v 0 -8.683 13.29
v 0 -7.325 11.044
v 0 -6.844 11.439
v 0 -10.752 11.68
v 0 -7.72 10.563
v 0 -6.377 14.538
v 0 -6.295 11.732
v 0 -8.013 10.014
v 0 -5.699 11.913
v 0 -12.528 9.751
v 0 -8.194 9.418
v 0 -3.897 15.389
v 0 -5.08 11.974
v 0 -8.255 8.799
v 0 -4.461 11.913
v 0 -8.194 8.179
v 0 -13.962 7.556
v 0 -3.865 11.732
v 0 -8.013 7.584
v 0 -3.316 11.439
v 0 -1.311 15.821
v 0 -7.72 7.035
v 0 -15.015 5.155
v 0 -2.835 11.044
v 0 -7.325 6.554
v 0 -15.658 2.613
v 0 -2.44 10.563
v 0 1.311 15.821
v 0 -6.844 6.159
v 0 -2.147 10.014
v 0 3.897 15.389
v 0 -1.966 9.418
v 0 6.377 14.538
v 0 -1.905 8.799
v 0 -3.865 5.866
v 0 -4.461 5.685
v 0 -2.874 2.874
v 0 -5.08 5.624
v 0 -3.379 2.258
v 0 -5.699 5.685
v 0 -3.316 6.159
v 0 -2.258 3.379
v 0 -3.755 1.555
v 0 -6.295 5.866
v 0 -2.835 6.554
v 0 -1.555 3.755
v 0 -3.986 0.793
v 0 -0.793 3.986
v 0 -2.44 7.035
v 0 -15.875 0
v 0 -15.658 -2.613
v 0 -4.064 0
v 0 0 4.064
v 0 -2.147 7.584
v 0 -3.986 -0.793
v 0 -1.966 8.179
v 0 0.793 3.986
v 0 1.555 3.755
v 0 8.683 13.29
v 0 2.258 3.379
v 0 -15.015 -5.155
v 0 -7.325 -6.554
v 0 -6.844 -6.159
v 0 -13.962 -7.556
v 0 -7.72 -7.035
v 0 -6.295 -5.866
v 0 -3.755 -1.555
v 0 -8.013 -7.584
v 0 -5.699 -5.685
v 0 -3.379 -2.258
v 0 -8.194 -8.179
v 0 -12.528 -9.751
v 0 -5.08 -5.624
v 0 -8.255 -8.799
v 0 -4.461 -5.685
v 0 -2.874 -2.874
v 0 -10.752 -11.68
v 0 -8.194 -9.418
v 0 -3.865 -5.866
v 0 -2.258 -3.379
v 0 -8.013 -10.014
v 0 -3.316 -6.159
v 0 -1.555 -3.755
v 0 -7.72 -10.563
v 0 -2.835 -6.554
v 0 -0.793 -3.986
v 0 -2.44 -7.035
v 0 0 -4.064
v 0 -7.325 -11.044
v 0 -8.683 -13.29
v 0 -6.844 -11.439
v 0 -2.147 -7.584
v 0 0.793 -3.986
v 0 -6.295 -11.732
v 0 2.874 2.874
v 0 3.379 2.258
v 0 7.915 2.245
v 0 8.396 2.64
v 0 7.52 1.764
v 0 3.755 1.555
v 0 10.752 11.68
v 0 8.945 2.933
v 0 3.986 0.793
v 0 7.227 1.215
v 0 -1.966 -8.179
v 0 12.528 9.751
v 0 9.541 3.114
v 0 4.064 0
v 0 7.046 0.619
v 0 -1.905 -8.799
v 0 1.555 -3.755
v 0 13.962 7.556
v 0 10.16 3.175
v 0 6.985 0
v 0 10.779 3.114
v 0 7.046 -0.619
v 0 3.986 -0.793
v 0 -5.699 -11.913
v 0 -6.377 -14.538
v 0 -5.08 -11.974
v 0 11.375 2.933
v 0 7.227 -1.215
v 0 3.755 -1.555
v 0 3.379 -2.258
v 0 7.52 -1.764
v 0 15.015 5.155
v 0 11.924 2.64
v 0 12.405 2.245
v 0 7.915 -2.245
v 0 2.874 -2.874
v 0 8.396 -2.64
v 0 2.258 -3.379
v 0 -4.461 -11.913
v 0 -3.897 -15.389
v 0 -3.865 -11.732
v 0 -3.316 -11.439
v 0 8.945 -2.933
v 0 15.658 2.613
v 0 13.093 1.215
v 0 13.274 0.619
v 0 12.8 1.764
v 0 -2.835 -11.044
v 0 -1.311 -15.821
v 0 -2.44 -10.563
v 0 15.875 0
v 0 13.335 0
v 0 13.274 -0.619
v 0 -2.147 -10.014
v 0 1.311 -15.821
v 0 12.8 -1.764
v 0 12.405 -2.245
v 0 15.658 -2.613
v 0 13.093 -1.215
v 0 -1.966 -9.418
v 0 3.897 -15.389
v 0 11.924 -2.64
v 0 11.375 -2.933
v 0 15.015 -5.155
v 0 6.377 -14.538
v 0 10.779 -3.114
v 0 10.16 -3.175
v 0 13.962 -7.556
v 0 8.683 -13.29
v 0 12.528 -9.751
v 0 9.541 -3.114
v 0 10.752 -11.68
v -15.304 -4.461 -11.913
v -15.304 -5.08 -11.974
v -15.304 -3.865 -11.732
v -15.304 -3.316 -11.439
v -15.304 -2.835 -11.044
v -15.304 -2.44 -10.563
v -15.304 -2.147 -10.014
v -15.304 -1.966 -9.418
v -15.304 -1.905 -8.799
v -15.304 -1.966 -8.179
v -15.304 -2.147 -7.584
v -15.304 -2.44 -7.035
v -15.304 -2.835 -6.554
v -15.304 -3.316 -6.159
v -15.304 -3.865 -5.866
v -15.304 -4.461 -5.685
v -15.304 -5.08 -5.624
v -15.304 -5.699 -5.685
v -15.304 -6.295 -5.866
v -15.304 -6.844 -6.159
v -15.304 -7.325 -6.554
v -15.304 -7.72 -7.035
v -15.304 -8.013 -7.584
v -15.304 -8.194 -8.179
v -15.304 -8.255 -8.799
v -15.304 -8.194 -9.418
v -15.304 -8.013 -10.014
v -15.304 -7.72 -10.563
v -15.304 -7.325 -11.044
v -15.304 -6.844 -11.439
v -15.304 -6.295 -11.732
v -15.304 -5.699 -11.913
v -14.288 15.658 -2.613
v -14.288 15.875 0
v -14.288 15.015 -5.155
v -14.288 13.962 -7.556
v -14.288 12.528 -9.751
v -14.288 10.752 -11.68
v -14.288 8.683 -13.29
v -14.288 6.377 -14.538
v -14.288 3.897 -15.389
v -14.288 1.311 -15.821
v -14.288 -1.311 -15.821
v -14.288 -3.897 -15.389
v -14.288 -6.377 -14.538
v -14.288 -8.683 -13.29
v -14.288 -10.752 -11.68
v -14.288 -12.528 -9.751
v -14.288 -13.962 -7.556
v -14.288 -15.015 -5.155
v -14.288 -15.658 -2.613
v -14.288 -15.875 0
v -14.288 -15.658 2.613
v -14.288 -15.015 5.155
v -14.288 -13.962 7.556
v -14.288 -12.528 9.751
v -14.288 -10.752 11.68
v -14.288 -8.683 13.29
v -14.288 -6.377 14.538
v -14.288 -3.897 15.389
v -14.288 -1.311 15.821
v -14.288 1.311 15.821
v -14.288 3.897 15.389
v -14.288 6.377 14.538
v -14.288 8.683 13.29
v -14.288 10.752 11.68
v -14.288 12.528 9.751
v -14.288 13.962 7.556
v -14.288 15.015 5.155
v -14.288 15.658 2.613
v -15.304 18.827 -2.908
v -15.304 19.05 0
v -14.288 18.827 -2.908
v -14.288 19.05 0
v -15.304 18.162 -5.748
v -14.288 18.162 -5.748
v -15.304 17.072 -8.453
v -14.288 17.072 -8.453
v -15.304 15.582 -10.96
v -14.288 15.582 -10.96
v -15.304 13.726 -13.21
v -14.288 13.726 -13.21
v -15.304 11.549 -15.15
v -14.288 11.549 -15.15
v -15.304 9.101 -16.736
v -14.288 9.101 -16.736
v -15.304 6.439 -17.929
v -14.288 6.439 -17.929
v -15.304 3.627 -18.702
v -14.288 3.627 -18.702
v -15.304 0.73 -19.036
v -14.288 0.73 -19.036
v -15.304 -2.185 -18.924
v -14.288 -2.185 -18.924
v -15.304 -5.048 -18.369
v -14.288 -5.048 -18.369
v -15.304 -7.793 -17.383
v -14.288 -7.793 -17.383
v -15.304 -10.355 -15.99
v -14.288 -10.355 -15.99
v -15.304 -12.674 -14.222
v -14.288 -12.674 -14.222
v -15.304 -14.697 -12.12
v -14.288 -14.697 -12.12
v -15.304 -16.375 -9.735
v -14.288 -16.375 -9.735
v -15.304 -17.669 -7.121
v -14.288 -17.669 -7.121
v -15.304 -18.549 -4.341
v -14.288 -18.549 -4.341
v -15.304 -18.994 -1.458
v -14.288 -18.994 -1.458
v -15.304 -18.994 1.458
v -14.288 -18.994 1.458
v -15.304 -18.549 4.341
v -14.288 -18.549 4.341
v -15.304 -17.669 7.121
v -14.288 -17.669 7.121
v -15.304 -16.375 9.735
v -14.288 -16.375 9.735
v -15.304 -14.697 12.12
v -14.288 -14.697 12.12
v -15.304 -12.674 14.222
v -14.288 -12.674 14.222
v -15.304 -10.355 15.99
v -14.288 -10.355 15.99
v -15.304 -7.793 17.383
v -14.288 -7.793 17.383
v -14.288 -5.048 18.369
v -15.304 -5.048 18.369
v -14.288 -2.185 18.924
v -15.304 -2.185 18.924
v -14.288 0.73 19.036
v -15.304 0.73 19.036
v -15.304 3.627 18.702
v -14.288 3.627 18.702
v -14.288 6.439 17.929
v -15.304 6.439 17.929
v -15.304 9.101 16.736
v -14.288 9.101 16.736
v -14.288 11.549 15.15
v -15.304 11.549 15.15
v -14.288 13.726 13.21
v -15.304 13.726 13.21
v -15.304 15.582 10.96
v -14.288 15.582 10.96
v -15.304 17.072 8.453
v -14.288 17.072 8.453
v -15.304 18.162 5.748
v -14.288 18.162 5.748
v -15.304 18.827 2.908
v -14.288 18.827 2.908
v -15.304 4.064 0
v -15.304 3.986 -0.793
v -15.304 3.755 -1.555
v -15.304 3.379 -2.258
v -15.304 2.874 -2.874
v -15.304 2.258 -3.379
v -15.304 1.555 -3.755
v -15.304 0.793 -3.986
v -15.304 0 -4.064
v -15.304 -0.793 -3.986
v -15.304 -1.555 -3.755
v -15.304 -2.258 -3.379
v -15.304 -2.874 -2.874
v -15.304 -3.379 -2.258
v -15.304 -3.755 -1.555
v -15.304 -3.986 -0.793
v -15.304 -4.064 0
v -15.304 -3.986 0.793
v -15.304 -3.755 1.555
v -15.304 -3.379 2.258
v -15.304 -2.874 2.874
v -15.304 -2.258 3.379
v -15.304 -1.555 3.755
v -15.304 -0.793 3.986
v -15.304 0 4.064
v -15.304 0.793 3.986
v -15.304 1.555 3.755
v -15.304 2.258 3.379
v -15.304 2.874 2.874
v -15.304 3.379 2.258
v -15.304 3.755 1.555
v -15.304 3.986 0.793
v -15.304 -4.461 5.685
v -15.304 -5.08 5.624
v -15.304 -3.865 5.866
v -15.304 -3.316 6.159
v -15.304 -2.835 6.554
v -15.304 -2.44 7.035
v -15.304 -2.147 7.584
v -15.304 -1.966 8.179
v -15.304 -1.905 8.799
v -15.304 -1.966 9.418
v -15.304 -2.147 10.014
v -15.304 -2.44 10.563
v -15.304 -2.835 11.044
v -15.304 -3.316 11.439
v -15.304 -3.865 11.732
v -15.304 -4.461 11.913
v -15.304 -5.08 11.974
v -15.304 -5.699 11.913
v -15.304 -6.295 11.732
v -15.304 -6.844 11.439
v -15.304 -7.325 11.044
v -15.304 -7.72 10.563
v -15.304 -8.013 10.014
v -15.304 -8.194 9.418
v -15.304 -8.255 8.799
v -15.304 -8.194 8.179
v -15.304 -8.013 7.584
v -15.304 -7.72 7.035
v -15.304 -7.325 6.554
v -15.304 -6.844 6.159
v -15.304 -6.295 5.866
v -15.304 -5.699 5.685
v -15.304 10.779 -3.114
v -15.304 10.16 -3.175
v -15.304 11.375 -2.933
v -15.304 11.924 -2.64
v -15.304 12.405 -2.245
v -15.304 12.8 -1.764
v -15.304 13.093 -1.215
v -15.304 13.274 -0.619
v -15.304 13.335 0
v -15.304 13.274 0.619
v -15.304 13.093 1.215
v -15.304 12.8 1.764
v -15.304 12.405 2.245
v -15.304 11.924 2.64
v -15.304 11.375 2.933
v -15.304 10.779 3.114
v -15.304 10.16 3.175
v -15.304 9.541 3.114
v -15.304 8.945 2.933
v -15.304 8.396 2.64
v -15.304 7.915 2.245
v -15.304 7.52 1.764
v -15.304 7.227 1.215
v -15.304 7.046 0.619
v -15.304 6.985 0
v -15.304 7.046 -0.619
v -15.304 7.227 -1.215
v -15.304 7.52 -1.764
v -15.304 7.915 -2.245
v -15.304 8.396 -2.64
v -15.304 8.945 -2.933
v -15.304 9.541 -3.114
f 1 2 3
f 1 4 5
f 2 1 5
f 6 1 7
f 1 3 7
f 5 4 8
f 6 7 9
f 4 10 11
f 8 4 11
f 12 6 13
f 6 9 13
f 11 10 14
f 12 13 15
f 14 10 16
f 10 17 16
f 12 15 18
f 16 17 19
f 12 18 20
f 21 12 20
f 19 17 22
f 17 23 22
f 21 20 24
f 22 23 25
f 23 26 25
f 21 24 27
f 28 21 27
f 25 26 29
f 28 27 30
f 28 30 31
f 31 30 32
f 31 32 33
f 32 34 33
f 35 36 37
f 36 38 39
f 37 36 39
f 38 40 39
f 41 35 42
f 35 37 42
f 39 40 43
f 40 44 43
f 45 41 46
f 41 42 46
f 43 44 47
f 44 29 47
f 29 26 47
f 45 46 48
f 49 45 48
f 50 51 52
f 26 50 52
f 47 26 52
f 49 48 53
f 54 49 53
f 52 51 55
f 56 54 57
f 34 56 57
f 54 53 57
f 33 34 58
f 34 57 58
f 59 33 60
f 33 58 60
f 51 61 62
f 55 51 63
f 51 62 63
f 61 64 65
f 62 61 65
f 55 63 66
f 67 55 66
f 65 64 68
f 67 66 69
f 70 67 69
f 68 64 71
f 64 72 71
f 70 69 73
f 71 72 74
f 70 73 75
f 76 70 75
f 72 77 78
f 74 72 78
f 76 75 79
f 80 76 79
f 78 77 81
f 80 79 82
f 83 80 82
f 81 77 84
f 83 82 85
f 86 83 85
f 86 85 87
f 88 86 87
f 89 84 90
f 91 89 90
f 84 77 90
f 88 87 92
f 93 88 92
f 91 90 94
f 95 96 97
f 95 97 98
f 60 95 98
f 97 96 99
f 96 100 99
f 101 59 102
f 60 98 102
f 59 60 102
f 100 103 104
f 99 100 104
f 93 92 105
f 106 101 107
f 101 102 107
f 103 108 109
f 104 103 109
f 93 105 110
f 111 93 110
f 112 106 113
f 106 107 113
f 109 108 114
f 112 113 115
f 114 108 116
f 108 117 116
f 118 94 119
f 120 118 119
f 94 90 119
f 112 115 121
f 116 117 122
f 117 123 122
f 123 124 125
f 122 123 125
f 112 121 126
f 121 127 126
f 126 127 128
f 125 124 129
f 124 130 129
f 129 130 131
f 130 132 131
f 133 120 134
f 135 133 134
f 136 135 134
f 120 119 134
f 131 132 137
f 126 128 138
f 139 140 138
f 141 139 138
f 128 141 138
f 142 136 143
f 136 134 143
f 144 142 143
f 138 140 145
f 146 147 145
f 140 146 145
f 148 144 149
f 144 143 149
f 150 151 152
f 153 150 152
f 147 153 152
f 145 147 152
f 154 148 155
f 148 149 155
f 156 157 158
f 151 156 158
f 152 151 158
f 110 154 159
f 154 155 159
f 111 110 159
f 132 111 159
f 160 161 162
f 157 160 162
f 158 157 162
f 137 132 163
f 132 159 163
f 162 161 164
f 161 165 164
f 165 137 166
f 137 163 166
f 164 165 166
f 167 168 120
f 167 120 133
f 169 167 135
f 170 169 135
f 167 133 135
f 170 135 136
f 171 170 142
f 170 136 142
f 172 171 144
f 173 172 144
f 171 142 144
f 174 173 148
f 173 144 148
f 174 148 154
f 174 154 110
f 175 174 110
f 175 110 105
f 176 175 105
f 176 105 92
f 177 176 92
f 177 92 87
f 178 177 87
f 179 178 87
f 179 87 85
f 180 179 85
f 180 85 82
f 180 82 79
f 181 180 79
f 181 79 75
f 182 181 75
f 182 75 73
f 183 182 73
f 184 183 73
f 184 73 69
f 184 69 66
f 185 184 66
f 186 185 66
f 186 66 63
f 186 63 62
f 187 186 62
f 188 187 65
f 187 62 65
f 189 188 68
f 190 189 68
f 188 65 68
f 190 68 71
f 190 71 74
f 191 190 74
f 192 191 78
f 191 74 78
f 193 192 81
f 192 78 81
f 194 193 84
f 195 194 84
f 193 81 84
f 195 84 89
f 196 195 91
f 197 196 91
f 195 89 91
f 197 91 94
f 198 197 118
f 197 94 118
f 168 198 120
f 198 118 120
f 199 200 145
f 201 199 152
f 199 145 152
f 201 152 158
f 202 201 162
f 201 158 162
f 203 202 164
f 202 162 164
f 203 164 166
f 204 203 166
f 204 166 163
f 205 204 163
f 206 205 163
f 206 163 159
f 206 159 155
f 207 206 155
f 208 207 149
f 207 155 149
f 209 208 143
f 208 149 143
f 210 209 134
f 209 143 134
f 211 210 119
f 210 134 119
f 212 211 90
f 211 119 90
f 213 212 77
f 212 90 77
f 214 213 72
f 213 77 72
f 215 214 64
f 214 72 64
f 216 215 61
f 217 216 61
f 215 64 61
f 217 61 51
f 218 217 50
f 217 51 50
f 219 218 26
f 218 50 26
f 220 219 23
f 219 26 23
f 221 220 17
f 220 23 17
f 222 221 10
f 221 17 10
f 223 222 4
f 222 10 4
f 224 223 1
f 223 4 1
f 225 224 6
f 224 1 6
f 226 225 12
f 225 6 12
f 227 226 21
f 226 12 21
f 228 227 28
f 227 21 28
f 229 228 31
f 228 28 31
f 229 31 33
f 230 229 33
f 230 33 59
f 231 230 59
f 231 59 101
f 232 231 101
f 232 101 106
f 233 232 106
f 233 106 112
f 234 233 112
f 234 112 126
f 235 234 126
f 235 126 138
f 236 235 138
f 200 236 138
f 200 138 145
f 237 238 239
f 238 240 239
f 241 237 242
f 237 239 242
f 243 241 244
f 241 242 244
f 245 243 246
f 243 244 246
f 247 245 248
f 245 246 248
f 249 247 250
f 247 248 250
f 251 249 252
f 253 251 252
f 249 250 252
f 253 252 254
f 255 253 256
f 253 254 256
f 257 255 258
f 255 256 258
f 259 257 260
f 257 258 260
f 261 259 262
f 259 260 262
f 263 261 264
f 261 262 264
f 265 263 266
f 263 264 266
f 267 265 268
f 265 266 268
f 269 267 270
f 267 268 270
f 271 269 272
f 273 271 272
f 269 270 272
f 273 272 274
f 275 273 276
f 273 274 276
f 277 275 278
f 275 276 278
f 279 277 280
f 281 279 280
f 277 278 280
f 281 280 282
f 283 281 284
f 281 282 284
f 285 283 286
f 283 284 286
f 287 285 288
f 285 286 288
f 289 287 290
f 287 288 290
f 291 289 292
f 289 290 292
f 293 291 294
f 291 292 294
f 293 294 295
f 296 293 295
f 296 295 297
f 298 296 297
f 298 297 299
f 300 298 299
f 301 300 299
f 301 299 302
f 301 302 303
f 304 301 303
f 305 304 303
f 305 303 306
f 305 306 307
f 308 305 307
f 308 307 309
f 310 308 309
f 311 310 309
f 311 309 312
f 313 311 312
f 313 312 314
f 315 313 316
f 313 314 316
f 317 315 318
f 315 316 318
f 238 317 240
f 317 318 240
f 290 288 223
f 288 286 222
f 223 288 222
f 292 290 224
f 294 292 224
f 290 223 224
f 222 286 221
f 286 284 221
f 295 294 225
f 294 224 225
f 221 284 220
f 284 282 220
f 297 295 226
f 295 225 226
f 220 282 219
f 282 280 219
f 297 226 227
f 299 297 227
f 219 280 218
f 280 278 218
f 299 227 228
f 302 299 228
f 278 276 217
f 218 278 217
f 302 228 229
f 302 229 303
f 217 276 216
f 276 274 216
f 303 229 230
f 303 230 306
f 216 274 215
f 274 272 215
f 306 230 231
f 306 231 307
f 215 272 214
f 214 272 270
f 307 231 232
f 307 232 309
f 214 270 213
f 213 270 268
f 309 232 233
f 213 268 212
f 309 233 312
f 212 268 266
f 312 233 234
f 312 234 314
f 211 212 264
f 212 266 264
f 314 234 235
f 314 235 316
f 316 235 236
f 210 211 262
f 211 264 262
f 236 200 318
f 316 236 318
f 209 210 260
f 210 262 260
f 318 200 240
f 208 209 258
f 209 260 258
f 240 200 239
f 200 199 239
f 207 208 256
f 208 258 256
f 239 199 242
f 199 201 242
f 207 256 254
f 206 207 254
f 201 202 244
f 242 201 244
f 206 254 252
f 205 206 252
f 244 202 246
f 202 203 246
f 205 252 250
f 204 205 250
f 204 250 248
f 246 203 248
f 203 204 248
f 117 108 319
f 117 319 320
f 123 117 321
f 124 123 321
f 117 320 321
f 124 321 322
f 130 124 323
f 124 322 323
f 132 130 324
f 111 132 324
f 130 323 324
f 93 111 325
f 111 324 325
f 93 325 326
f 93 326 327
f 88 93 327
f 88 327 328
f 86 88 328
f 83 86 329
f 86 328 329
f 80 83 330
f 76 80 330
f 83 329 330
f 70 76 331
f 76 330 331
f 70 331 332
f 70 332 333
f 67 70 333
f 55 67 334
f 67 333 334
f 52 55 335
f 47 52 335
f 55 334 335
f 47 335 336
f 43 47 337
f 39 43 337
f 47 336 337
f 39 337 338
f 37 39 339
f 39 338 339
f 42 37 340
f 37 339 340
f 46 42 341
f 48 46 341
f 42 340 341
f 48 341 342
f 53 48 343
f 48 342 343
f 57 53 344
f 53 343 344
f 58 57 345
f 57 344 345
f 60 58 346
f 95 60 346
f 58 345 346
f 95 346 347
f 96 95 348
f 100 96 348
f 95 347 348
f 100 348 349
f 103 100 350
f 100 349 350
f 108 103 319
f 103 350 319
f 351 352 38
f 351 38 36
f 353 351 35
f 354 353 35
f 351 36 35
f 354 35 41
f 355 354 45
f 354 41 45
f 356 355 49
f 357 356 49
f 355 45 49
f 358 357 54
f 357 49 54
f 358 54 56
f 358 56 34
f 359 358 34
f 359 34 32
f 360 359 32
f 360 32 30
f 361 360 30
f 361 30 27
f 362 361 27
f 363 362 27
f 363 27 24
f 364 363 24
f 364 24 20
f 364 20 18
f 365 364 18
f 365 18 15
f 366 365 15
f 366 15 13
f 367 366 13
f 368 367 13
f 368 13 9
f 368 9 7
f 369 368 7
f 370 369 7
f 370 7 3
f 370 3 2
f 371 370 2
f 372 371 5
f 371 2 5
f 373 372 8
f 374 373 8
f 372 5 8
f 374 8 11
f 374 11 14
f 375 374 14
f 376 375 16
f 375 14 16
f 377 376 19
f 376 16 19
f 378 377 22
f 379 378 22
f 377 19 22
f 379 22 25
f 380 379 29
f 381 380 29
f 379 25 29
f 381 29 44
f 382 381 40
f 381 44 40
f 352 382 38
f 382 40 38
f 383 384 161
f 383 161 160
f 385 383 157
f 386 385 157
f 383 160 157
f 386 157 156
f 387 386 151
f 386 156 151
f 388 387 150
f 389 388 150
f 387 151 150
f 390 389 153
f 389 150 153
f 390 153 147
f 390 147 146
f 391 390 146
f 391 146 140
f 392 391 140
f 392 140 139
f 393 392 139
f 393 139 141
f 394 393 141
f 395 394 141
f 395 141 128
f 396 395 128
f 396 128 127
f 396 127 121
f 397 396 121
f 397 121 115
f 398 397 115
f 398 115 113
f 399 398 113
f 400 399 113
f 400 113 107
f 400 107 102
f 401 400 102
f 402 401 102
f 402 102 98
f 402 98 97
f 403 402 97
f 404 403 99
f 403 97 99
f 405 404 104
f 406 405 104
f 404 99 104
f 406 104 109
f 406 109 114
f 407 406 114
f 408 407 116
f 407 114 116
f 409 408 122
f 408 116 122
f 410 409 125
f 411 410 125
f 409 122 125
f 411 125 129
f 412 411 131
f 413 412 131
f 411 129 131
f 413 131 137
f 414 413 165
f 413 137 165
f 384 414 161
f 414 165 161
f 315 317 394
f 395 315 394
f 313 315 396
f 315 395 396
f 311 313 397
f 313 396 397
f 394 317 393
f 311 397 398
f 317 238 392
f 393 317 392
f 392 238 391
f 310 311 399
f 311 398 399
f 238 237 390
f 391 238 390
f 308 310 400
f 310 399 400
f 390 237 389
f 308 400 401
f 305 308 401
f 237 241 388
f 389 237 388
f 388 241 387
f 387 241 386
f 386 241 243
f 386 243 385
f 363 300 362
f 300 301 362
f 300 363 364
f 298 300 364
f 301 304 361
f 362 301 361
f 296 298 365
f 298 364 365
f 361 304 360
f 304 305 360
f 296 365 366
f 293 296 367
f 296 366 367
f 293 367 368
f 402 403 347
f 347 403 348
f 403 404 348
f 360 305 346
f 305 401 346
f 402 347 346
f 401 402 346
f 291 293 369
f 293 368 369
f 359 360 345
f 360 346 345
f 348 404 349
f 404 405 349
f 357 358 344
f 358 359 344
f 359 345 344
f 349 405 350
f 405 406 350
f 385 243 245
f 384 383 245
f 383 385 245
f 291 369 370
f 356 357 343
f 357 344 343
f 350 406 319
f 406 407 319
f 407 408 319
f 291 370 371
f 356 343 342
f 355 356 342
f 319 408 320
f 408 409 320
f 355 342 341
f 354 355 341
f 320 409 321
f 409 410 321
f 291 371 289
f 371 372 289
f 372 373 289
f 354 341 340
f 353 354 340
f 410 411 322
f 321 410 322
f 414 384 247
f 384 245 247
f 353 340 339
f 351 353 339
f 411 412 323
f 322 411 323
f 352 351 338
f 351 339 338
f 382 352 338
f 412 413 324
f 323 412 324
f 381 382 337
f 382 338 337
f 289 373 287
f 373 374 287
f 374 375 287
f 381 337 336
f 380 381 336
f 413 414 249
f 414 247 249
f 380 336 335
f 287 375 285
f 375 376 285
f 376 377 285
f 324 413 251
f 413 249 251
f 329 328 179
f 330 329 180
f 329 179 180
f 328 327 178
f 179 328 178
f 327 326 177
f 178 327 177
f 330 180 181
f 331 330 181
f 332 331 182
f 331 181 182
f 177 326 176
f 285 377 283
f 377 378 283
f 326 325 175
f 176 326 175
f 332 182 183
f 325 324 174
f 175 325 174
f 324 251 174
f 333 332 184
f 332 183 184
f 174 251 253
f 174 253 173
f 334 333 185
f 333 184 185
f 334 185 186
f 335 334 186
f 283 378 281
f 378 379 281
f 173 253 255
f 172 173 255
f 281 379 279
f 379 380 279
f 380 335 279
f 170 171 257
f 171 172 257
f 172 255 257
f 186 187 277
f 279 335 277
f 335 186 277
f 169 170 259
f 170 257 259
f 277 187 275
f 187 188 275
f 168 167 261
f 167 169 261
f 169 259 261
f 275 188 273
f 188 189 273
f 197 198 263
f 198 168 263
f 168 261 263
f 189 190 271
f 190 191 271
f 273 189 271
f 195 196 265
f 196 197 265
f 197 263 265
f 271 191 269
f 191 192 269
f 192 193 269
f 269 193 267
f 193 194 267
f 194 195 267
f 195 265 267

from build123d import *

# Parameters (mm, degrees)
F_1_4_0_2500_DOWEL_HOLE1_D = 6.35


with BuildPart() as part:
    # Sketch1 → Revolve1 (revolve)
    with BuildSketch(Plane.XY):
        Polygon((0, 4.064), (-15.3035, 4.064), (-15.3035, 19.05), (-14.2875, 19.05), (-14.2875, 15.875), (0, 15.875), align=None)
    revolve(axis=Axis((0, 0, 0), (-1, 0, 0)))

    # 1/4 (0.2500) Dowel Hole1 (through all)
    with Locations(Plane.ZY.offset(15.3035)):
        with Locations((0, 10.16), (8.798818102, -5.08), (-8.798818102, -5.08)):
            Hole(F_1_4_0_2500_DOWEL_HOLE1_D / 2)


solid = part.part
